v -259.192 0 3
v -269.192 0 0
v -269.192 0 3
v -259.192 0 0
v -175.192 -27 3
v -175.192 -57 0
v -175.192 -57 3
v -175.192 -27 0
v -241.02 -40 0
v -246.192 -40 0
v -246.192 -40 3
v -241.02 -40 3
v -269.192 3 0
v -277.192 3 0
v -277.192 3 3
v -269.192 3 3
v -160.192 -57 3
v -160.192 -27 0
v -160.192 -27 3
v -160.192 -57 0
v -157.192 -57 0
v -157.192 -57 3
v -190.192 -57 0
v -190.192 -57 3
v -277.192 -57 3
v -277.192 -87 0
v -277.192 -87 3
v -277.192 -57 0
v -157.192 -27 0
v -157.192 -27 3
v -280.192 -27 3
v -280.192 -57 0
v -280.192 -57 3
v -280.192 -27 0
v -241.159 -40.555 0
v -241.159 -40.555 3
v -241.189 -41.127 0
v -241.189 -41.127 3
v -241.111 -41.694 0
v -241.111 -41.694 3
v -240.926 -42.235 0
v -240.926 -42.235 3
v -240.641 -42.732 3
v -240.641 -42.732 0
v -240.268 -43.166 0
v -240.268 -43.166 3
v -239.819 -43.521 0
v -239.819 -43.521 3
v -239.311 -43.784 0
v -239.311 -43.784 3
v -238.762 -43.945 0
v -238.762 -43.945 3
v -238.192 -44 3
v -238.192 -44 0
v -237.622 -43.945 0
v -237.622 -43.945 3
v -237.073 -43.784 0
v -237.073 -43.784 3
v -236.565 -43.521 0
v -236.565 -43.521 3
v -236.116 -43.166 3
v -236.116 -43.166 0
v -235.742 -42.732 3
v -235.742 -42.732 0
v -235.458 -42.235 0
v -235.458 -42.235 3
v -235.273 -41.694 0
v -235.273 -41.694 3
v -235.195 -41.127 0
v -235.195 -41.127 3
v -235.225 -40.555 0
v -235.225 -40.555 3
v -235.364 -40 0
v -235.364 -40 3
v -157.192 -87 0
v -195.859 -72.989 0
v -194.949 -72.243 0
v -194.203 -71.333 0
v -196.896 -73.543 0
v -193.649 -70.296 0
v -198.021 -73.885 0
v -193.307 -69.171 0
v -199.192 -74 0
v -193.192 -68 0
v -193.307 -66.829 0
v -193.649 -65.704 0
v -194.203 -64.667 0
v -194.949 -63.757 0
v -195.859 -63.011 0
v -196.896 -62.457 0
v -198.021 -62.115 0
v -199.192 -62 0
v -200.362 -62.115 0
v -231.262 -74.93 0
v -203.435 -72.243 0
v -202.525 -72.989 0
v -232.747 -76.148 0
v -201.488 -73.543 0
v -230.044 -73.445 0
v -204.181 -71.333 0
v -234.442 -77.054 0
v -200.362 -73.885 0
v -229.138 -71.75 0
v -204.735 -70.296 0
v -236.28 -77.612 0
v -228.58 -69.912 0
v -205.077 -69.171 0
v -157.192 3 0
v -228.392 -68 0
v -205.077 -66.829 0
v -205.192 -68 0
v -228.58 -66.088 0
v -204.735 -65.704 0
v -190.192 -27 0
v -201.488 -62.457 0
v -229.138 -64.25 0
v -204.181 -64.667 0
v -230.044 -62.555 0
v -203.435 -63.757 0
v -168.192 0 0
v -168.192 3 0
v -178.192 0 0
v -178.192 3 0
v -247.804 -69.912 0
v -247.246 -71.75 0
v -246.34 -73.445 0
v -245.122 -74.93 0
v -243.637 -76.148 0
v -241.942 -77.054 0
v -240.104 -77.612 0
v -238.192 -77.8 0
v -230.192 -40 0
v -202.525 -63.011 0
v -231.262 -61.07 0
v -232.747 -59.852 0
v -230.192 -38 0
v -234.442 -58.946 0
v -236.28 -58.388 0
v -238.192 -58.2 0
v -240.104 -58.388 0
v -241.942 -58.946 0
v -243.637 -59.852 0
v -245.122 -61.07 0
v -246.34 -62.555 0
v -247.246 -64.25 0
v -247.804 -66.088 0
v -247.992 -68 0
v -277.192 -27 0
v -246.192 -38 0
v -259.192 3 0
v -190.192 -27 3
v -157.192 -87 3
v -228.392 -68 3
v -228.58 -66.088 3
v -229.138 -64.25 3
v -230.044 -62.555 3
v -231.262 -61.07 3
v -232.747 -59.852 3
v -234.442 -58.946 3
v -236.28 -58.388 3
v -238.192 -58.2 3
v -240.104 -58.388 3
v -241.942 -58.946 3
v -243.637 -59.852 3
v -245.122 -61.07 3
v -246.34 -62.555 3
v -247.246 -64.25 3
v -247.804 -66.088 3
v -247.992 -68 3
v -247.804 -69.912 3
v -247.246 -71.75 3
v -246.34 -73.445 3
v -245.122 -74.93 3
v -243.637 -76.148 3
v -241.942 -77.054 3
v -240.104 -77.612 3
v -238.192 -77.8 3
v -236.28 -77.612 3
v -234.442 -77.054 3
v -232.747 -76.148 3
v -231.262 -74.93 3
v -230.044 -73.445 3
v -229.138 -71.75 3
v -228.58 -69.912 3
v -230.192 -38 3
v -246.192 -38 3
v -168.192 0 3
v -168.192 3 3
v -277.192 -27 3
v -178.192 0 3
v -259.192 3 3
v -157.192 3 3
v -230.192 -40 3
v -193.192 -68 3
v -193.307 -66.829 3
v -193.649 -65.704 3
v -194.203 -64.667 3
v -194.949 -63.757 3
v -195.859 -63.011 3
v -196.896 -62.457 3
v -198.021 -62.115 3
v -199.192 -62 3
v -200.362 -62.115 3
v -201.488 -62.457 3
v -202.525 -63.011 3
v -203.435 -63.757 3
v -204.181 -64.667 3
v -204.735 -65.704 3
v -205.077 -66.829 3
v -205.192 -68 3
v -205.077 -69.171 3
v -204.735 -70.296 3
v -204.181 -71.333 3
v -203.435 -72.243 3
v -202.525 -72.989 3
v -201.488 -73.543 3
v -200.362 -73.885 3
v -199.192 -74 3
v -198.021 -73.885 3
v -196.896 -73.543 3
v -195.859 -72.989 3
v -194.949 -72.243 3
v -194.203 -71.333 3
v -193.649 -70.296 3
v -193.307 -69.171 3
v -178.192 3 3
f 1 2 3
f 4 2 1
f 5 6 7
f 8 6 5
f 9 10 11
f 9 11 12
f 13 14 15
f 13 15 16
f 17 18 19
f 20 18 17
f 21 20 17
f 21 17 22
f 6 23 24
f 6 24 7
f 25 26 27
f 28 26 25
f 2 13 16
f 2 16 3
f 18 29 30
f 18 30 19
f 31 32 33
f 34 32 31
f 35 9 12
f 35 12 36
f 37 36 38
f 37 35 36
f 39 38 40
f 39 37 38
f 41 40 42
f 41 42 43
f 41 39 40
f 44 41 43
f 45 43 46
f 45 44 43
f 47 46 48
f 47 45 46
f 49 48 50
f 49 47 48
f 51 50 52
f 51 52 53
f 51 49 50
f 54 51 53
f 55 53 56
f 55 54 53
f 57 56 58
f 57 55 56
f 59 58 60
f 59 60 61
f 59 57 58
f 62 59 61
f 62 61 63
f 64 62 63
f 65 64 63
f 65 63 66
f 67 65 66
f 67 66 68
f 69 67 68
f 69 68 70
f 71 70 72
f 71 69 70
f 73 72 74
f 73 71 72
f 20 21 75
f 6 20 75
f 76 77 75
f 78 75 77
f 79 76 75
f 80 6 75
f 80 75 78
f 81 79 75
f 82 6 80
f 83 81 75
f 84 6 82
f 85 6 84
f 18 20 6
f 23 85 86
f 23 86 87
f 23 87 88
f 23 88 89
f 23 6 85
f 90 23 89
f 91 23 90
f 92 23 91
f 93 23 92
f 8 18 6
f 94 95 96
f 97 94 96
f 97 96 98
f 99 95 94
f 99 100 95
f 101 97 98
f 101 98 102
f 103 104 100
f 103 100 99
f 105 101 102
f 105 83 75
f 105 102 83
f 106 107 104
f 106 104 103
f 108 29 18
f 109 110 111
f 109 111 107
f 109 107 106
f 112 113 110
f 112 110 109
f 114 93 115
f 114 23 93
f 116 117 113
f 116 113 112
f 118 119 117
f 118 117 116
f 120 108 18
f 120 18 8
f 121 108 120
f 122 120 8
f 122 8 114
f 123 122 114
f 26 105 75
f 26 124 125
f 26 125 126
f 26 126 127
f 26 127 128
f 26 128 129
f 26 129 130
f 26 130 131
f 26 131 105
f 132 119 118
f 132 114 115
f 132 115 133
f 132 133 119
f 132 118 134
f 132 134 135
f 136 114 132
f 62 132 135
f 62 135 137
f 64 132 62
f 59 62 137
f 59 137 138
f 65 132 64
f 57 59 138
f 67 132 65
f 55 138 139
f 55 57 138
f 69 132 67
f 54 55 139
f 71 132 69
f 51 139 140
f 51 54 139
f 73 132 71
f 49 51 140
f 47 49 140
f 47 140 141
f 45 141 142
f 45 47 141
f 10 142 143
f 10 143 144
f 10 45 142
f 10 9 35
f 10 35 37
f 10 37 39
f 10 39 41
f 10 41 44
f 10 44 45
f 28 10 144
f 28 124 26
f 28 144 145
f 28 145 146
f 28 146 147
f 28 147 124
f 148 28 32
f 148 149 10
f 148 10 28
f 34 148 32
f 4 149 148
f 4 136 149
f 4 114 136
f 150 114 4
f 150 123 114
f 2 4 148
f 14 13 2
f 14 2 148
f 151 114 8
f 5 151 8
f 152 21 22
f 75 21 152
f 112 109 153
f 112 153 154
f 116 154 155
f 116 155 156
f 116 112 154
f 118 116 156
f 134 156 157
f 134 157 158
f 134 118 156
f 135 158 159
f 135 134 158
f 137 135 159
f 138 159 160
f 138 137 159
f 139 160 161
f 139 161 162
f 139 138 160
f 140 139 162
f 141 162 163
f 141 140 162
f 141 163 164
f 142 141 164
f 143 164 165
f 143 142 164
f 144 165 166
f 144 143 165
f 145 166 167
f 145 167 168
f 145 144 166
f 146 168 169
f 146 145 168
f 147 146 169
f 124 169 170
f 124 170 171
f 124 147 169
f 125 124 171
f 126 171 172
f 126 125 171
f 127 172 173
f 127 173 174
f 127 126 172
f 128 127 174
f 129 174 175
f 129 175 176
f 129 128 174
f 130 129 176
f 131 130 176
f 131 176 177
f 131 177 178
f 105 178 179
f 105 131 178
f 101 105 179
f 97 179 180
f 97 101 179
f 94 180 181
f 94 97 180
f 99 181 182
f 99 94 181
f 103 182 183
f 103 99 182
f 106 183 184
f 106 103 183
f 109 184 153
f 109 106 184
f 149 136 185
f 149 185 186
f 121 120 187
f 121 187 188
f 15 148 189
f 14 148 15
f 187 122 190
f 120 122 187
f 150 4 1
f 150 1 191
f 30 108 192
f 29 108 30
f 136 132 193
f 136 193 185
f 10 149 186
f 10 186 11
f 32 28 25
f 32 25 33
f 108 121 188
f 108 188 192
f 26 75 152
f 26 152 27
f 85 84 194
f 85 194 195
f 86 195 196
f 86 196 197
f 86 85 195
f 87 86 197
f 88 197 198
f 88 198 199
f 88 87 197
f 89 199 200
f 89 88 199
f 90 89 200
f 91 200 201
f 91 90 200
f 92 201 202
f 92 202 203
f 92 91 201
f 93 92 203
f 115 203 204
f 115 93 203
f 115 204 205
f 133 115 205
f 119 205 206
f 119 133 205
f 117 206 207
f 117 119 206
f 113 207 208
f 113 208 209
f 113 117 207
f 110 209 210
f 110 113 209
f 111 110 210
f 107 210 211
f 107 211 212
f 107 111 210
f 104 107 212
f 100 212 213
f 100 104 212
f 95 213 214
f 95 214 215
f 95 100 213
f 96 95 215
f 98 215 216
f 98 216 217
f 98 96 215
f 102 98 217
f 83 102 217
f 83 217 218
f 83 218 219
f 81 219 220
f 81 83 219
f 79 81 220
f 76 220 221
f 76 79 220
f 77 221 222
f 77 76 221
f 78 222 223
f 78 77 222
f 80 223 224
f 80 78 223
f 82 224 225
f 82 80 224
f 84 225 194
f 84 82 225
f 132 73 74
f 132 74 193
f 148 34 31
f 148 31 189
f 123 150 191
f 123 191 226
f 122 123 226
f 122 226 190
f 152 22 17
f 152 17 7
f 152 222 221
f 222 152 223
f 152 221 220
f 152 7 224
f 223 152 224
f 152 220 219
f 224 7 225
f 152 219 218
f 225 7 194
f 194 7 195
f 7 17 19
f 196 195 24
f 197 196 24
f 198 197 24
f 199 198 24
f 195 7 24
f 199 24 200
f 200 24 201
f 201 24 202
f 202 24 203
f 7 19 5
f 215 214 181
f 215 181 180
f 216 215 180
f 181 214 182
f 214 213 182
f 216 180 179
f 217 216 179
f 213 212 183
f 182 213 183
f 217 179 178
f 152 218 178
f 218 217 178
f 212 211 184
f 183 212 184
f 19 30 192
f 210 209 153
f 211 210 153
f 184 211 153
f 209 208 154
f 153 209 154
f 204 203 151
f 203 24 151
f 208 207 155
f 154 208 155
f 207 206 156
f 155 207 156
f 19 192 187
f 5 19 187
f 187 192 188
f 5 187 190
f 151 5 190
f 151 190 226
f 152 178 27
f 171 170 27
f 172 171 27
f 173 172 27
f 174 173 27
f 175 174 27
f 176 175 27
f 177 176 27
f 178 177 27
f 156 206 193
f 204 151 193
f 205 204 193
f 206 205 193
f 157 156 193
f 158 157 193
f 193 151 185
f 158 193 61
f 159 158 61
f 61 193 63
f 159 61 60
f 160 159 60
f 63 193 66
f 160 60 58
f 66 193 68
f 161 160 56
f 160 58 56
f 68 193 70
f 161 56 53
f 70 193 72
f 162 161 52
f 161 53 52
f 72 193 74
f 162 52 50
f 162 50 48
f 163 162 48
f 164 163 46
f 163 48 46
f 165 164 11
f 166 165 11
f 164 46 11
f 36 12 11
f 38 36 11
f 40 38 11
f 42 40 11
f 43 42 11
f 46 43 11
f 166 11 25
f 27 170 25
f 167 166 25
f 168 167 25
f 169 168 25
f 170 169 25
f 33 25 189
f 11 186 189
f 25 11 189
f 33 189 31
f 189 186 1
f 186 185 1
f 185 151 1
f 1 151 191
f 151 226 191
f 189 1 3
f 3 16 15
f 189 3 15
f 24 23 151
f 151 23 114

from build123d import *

# Parameters (mm, degrees)
MODEL_R             = 9.8
MODEL_R_2           = 6
MODEL_W             = 15
MODEL_H             = 30
BOSS_EXTRUDE1_DEPTH = 3


with BuildPart() as part:
    # Model → Boss-Extrude1 (new body)
    with BuildSketch(Plane.XY):
        Polygon((-160.191927583, -27), (-160.191927583, -57), (-157.191927583, -57), (-157.191927583, -87), (-277.191927583, -87), (-277.191927583, -57), (-280.191927583, -57), (-280.191927583, -27), (-277.191927583, -27), (-277.191927583, 3), (-269.191927583, 3), (-269.191927583, 0), (-259.191927583, 0), (-259.191927583, 3), (-178.191927583, 3), (-178.191927583, 0), (-168.191927583, 0), (-168.191927583, 3), (-157.191927583, 3), (-157.191927583, -27), align=None)
        with Locations((-238.191927583, -68)):
            Circle(MODEL_R, mode=Mode.SUBTRACT)
        with Locations((-199.191927583, -68)):
            Circle(MODEL_R_2, mode=Mode.SUBTRACT)
        with Locations((-182.691927583, -42)):
            Rectangle(MODEL_W, MODEL_H, mode=Mode.SUBTRACT)
        with BuildLine():
            Line((-235.363500459, -40), (-230.191927583, -40))
            Line((-230.191927583, -40), (-230.191927583, -38))
            Line((-230.191927583, -38), (-246.191927583, -38))
            Line((-246.191927583, -38), (-246.191927583, -40))
            Line((-246.191927583, -40), (-241.020354708, -40))
            ThreePointArc((-241.020354708, -40), (-238.191927583, -44), (-235.363500459, -40))
        make_face(mode=Mode.SUBTRACT)
    extrude(amount=BOSS_EXTRUDE1_DEPTH)


solid = part.part
